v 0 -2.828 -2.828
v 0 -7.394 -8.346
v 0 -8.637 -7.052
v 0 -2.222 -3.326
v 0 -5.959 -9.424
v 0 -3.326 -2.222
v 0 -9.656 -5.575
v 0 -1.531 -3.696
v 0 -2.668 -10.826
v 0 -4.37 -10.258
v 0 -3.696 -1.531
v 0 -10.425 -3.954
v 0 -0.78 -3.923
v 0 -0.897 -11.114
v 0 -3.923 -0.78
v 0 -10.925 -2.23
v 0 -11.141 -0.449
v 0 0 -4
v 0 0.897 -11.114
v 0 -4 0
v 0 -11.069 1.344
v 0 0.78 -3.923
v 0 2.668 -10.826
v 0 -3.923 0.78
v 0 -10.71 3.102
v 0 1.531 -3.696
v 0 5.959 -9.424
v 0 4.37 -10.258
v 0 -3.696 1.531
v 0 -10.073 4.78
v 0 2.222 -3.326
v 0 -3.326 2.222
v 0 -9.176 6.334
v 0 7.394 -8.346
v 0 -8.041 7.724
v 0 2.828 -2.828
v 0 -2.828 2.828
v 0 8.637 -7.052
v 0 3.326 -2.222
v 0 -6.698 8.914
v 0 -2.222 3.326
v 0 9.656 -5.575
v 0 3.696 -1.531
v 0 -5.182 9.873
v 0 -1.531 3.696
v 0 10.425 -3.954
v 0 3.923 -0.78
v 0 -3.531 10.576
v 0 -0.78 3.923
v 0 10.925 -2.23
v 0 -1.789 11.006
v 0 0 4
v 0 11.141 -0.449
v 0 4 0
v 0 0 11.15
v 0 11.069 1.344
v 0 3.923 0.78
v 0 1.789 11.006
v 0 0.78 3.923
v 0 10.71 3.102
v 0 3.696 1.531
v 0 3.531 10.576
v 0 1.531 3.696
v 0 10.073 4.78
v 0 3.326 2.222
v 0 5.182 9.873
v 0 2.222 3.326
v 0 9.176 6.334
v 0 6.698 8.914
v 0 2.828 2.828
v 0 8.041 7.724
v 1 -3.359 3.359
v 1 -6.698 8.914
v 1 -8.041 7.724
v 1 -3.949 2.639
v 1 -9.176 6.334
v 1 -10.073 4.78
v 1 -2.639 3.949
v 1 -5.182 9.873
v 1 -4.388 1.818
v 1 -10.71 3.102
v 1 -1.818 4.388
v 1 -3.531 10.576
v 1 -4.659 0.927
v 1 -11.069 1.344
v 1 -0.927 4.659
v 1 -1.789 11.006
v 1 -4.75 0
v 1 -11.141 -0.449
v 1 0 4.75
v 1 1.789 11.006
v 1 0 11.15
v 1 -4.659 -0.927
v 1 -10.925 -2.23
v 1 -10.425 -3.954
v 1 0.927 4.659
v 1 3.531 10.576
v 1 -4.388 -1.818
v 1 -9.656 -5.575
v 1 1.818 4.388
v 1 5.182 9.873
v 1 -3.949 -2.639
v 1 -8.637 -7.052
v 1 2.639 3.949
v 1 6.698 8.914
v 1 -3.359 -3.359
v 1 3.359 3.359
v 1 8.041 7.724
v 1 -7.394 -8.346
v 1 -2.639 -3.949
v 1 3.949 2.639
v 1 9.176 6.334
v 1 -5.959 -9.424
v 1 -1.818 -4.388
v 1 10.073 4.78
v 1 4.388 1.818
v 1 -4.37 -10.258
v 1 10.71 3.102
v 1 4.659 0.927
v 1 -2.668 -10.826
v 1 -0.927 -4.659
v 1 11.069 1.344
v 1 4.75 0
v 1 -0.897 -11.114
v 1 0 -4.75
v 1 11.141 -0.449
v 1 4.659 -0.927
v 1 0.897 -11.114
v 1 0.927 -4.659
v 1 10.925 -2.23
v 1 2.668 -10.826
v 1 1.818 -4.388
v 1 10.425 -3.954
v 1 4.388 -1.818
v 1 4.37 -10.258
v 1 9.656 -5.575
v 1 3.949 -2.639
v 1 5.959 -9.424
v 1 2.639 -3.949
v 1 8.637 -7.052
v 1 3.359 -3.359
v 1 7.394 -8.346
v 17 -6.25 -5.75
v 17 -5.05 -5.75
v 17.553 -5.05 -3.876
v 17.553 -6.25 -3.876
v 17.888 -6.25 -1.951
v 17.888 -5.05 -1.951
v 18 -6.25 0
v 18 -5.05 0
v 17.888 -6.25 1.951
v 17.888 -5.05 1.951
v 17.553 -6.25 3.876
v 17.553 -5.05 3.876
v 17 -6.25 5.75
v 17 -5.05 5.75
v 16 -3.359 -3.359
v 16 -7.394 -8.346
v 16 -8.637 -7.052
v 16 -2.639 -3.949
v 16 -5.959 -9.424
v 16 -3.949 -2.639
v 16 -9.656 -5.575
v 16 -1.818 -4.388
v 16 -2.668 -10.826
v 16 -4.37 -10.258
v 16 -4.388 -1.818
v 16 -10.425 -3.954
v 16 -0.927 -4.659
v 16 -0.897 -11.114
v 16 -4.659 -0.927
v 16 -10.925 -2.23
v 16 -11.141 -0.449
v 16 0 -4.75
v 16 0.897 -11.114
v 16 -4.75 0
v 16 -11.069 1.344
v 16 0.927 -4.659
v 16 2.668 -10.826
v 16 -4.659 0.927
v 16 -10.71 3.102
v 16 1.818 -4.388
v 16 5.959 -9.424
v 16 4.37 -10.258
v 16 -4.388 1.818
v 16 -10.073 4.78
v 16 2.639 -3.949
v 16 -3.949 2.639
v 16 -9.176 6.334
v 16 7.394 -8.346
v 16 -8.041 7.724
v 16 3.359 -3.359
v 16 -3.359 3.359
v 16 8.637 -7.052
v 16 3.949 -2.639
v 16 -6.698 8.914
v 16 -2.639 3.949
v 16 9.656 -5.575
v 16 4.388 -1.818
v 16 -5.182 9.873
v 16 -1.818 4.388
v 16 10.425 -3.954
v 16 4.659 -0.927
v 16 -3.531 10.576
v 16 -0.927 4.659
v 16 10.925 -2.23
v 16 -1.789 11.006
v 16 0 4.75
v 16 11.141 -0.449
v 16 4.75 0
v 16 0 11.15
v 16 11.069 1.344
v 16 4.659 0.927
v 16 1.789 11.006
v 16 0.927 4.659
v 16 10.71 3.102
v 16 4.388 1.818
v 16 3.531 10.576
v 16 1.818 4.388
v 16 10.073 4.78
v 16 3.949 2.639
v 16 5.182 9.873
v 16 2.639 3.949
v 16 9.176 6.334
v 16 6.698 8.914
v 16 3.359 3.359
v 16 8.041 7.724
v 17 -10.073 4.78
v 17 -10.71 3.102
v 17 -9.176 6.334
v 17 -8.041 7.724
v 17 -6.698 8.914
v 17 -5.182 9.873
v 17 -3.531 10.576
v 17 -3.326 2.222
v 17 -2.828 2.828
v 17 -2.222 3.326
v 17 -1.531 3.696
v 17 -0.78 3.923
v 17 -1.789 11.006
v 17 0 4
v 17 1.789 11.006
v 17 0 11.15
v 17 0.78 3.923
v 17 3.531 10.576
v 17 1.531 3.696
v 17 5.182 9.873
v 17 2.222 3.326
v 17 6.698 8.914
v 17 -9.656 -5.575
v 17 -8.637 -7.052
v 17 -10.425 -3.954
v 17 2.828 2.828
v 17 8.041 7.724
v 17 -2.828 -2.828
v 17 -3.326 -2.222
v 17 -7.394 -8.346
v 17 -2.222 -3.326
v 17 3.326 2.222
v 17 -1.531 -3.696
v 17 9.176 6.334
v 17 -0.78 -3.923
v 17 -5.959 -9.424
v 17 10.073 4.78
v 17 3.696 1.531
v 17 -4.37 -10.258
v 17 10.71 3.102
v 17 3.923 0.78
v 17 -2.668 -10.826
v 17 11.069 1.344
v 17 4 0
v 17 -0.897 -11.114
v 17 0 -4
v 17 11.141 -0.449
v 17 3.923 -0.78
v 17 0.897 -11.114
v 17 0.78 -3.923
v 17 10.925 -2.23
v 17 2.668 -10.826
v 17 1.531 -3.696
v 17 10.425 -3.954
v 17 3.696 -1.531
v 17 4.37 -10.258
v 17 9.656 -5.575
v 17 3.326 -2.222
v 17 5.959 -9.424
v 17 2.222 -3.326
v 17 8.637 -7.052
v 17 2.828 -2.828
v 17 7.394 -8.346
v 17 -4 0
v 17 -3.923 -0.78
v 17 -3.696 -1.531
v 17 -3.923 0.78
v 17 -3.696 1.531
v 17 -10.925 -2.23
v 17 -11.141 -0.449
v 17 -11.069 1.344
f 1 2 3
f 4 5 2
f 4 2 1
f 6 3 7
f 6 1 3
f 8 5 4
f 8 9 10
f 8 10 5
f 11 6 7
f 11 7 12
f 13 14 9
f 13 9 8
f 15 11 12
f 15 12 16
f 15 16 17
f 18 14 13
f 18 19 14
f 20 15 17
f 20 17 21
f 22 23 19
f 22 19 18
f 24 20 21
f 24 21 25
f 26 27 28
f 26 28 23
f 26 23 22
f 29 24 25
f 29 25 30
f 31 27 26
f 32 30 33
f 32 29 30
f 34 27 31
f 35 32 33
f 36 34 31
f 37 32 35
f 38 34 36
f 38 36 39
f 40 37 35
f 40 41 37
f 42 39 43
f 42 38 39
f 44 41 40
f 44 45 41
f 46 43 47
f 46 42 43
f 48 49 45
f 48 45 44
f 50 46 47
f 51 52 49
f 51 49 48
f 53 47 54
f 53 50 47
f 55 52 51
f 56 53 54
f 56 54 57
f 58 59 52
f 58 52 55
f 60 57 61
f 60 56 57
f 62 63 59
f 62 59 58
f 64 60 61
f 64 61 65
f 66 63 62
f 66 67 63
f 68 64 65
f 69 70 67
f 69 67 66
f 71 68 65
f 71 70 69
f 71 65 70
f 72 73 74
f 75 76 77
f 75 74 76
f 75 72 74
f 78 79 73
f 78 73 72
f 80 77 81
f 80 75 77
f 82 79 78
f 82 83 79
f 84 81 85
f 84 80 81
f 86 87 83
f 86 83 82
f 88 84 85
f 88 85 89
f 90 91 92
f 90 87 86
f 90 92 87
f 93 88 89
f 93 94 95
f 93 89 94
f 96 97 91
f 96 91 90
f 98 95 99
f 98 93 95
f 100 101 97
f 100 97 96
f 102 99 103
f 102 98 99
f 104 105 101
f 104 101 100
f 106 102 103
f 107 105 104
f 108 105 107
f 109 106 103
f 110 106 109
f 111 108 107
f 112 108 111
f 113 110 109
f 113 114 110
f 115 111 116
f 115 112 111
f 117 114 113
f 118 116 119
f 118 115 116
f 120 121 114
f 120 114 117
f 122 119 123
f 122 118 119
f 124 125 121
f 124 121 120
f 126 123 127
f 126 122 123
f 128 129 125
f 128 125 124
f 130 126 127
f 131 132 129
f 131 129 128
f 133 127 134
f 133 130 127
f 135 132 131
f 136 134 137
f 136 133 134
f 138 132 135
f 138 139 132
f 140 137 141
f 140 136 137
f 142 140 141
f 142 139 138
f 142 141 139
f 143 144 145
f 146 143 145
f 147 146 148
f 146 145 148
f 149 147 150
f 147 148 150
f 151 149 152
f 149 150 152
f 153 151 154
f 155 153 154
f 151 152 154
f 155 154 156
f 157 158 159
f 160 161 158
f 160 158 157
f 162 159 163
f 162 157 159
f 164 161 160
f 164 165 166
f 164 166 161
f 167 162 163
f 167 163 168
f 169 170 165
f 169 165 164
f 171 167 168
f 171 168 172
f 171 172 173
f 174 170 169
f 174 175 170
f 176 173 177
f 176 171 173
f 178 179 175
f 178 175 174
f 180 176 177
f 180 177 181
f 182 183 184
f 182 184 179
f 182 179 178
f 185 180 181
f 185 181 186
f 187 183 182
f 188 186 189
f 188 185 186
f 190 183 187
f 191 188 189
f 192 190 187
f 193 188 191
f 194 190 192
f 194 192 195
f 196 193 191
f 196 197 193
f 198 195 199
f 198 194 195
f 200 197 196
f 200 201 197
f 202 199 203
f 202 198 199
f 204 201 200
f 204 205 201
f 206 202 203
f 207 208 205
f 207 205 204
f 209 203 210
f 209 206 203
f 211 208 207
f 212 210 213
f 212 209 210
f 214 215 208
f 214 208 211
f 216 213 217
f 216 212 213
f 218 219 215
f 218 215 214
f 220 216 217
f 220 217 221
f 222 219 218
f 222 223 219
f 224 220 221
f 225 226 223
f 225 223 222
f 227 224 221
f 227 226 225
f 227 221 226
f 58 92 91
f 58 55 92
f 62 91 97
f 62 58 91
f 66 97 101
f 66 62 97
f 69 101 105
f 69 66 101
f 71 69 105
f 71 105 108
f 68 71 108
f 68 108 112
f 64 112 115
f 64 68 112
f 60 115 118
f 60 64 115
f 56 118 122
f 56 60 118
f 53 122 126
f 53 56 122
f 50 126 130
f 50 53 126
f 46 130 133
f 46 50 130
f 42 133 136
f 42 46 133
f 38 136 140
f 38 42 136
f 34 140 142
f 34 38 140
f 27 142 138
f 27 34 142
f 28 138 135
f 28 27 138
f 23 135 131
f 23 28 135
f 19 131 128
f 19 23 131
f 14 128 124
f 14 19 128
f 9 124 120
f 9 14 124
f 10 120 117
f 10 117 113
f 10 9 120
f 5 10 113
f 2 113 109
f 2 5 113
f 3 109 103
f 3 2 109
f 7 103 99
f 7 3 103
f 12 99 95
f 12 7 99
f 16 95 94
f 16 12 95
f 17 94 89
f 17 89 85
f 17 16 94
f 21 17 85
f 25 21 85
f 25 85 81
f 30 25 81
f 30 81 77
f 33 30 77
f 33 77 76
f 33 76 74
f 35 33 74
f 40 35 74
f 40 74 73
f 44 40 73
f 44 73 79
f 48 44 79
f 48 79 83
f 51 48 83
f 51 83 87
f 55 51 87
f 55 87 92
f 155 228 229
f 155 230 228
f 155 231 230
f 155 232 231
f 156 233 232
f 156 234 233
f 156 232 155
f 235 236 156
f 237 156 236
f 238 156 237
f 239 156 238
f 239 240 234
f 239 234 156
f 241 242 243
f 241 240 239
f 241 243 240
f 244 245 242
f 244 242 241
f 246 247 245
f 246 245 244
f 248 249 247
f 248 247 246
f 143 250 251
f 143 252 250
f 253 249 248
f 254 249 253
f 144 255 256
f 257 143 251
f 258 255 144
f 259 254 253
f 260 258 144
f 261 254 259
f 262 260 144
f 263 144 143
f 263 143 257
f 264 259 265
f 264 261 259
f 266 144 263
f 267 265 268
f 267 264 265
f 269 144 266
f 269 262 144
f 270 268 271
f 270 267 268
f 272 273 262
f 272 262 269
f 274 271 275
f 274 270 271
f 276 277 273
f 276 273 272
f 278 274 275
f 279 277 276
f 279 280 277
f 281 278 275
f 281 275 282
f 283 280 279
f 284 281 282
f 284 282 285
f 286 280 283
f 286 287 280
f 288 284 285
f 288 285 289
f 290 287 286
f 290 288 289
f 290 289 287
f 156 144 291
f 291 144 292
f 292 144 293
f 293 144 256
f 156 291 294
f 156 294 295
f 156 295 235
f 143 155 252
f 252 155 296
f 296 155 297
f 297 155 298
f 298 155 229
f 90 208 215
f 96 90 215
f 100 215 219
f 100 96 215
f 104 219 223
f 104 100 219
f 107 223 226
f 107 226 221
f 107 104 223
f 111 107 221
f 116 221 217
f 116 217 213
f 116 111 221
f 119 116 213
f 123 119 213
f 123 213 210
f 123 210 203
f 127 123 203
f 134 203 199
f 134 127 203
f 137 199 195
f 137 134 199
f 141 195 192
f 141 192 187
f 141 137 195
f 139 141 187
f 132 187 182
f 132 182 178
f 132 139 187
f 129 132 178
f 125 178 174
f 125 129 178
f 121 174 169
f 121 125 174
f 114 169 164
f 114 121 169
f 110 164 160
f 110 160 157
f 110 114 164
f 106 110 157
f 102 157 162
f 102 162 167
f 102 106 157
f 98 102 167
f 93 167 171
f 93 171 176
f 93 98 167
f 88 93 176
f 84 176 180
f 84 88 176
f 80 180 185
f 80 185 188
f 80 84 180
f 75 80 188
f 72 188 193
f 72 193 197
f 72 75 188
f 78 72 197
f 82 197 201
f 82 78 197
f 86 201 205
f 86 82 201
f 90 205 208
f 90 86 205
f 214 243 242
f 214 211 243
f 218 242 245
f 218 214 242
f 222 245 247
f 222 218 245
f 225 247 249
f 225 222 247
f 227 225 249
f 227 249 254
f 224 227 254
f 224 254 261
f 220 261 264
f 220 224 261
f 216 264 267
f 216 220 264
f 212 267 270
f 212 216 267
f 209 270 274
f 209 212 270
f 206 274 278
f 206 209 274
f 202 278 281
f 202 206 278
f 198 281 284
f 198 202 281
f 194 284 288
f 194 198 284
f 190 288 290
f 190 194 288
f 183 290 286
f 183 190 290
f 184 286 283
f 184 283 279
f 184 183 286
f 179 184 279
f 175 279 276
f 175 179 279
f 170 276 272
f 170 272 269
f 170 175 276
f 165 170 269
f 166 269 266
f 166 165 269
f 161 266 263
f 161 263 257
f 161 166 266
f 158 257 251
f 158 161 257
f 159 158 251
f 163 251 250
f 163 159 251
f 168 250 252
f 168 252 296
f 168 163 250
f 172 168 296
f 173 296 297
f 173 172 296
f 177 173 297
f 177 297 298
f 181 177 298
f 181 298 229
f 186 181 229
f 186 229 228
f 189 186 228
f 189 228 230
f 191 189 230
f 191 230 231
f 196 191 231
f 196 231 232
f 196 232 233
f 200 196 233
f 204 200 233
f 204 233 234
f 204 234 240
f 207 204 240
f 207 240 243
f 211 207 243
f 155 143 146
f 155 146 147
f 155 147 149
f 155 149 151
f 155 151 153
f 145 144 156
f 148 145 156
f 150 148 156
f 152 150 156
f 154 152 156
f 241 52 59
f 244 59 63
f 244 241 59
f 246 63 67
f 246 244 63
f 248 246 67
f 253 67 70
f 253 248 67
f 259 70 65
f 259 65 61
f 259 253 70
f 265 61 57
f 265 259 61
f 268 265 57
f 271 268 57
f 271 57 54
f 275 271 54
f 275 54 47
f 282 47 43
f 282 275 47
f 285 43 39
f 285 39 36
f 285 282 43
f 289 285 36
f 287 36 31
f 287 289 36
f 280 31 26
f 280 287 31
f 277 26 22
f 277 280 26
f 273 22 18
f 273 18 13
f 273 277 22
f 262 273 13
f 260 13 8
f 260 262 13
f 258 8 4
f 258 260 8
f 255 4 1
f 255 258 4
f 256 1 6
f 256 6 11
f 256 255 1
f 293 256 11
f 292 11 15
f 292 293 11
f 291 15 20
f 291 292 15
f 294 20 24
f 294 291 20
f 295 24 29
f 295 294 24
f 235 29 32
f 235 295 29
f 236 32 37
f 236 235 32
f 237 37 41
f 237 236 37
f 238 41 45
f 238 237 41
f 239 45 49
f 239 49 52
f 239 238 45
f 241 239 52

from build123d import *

# Parameters (mm, degrees)
F3_START = 5.05
F3_DEPTH = 1.2


with BuildPart() as f1:
    # F0 (on Front) → F1 (revolve)
    with BuildSketch(Plane.XZ):
        Polygon((0, 11.15), (0, 4), (17, 4), (17, 11.15), (16, 11.15), (16, 4.75), (1, 4.75), (1, 11.15), align=None)
    revolve(axis=Axis((9.8618045449, 0, 0), (-1, 0, 0)))

    # F2 (on Front) → F3 (join)
    with BuildSketch(Plane.XZ.offset(F3_START)):
        with BuildLine():
            Line((17, 5.75), (17, -5.75))
            ThreePointArc((17, -5.75), (18, 0), (17, 5.75))
        make_face()
    extrude(amount=F3_DEPTH)


solid = f1.part
